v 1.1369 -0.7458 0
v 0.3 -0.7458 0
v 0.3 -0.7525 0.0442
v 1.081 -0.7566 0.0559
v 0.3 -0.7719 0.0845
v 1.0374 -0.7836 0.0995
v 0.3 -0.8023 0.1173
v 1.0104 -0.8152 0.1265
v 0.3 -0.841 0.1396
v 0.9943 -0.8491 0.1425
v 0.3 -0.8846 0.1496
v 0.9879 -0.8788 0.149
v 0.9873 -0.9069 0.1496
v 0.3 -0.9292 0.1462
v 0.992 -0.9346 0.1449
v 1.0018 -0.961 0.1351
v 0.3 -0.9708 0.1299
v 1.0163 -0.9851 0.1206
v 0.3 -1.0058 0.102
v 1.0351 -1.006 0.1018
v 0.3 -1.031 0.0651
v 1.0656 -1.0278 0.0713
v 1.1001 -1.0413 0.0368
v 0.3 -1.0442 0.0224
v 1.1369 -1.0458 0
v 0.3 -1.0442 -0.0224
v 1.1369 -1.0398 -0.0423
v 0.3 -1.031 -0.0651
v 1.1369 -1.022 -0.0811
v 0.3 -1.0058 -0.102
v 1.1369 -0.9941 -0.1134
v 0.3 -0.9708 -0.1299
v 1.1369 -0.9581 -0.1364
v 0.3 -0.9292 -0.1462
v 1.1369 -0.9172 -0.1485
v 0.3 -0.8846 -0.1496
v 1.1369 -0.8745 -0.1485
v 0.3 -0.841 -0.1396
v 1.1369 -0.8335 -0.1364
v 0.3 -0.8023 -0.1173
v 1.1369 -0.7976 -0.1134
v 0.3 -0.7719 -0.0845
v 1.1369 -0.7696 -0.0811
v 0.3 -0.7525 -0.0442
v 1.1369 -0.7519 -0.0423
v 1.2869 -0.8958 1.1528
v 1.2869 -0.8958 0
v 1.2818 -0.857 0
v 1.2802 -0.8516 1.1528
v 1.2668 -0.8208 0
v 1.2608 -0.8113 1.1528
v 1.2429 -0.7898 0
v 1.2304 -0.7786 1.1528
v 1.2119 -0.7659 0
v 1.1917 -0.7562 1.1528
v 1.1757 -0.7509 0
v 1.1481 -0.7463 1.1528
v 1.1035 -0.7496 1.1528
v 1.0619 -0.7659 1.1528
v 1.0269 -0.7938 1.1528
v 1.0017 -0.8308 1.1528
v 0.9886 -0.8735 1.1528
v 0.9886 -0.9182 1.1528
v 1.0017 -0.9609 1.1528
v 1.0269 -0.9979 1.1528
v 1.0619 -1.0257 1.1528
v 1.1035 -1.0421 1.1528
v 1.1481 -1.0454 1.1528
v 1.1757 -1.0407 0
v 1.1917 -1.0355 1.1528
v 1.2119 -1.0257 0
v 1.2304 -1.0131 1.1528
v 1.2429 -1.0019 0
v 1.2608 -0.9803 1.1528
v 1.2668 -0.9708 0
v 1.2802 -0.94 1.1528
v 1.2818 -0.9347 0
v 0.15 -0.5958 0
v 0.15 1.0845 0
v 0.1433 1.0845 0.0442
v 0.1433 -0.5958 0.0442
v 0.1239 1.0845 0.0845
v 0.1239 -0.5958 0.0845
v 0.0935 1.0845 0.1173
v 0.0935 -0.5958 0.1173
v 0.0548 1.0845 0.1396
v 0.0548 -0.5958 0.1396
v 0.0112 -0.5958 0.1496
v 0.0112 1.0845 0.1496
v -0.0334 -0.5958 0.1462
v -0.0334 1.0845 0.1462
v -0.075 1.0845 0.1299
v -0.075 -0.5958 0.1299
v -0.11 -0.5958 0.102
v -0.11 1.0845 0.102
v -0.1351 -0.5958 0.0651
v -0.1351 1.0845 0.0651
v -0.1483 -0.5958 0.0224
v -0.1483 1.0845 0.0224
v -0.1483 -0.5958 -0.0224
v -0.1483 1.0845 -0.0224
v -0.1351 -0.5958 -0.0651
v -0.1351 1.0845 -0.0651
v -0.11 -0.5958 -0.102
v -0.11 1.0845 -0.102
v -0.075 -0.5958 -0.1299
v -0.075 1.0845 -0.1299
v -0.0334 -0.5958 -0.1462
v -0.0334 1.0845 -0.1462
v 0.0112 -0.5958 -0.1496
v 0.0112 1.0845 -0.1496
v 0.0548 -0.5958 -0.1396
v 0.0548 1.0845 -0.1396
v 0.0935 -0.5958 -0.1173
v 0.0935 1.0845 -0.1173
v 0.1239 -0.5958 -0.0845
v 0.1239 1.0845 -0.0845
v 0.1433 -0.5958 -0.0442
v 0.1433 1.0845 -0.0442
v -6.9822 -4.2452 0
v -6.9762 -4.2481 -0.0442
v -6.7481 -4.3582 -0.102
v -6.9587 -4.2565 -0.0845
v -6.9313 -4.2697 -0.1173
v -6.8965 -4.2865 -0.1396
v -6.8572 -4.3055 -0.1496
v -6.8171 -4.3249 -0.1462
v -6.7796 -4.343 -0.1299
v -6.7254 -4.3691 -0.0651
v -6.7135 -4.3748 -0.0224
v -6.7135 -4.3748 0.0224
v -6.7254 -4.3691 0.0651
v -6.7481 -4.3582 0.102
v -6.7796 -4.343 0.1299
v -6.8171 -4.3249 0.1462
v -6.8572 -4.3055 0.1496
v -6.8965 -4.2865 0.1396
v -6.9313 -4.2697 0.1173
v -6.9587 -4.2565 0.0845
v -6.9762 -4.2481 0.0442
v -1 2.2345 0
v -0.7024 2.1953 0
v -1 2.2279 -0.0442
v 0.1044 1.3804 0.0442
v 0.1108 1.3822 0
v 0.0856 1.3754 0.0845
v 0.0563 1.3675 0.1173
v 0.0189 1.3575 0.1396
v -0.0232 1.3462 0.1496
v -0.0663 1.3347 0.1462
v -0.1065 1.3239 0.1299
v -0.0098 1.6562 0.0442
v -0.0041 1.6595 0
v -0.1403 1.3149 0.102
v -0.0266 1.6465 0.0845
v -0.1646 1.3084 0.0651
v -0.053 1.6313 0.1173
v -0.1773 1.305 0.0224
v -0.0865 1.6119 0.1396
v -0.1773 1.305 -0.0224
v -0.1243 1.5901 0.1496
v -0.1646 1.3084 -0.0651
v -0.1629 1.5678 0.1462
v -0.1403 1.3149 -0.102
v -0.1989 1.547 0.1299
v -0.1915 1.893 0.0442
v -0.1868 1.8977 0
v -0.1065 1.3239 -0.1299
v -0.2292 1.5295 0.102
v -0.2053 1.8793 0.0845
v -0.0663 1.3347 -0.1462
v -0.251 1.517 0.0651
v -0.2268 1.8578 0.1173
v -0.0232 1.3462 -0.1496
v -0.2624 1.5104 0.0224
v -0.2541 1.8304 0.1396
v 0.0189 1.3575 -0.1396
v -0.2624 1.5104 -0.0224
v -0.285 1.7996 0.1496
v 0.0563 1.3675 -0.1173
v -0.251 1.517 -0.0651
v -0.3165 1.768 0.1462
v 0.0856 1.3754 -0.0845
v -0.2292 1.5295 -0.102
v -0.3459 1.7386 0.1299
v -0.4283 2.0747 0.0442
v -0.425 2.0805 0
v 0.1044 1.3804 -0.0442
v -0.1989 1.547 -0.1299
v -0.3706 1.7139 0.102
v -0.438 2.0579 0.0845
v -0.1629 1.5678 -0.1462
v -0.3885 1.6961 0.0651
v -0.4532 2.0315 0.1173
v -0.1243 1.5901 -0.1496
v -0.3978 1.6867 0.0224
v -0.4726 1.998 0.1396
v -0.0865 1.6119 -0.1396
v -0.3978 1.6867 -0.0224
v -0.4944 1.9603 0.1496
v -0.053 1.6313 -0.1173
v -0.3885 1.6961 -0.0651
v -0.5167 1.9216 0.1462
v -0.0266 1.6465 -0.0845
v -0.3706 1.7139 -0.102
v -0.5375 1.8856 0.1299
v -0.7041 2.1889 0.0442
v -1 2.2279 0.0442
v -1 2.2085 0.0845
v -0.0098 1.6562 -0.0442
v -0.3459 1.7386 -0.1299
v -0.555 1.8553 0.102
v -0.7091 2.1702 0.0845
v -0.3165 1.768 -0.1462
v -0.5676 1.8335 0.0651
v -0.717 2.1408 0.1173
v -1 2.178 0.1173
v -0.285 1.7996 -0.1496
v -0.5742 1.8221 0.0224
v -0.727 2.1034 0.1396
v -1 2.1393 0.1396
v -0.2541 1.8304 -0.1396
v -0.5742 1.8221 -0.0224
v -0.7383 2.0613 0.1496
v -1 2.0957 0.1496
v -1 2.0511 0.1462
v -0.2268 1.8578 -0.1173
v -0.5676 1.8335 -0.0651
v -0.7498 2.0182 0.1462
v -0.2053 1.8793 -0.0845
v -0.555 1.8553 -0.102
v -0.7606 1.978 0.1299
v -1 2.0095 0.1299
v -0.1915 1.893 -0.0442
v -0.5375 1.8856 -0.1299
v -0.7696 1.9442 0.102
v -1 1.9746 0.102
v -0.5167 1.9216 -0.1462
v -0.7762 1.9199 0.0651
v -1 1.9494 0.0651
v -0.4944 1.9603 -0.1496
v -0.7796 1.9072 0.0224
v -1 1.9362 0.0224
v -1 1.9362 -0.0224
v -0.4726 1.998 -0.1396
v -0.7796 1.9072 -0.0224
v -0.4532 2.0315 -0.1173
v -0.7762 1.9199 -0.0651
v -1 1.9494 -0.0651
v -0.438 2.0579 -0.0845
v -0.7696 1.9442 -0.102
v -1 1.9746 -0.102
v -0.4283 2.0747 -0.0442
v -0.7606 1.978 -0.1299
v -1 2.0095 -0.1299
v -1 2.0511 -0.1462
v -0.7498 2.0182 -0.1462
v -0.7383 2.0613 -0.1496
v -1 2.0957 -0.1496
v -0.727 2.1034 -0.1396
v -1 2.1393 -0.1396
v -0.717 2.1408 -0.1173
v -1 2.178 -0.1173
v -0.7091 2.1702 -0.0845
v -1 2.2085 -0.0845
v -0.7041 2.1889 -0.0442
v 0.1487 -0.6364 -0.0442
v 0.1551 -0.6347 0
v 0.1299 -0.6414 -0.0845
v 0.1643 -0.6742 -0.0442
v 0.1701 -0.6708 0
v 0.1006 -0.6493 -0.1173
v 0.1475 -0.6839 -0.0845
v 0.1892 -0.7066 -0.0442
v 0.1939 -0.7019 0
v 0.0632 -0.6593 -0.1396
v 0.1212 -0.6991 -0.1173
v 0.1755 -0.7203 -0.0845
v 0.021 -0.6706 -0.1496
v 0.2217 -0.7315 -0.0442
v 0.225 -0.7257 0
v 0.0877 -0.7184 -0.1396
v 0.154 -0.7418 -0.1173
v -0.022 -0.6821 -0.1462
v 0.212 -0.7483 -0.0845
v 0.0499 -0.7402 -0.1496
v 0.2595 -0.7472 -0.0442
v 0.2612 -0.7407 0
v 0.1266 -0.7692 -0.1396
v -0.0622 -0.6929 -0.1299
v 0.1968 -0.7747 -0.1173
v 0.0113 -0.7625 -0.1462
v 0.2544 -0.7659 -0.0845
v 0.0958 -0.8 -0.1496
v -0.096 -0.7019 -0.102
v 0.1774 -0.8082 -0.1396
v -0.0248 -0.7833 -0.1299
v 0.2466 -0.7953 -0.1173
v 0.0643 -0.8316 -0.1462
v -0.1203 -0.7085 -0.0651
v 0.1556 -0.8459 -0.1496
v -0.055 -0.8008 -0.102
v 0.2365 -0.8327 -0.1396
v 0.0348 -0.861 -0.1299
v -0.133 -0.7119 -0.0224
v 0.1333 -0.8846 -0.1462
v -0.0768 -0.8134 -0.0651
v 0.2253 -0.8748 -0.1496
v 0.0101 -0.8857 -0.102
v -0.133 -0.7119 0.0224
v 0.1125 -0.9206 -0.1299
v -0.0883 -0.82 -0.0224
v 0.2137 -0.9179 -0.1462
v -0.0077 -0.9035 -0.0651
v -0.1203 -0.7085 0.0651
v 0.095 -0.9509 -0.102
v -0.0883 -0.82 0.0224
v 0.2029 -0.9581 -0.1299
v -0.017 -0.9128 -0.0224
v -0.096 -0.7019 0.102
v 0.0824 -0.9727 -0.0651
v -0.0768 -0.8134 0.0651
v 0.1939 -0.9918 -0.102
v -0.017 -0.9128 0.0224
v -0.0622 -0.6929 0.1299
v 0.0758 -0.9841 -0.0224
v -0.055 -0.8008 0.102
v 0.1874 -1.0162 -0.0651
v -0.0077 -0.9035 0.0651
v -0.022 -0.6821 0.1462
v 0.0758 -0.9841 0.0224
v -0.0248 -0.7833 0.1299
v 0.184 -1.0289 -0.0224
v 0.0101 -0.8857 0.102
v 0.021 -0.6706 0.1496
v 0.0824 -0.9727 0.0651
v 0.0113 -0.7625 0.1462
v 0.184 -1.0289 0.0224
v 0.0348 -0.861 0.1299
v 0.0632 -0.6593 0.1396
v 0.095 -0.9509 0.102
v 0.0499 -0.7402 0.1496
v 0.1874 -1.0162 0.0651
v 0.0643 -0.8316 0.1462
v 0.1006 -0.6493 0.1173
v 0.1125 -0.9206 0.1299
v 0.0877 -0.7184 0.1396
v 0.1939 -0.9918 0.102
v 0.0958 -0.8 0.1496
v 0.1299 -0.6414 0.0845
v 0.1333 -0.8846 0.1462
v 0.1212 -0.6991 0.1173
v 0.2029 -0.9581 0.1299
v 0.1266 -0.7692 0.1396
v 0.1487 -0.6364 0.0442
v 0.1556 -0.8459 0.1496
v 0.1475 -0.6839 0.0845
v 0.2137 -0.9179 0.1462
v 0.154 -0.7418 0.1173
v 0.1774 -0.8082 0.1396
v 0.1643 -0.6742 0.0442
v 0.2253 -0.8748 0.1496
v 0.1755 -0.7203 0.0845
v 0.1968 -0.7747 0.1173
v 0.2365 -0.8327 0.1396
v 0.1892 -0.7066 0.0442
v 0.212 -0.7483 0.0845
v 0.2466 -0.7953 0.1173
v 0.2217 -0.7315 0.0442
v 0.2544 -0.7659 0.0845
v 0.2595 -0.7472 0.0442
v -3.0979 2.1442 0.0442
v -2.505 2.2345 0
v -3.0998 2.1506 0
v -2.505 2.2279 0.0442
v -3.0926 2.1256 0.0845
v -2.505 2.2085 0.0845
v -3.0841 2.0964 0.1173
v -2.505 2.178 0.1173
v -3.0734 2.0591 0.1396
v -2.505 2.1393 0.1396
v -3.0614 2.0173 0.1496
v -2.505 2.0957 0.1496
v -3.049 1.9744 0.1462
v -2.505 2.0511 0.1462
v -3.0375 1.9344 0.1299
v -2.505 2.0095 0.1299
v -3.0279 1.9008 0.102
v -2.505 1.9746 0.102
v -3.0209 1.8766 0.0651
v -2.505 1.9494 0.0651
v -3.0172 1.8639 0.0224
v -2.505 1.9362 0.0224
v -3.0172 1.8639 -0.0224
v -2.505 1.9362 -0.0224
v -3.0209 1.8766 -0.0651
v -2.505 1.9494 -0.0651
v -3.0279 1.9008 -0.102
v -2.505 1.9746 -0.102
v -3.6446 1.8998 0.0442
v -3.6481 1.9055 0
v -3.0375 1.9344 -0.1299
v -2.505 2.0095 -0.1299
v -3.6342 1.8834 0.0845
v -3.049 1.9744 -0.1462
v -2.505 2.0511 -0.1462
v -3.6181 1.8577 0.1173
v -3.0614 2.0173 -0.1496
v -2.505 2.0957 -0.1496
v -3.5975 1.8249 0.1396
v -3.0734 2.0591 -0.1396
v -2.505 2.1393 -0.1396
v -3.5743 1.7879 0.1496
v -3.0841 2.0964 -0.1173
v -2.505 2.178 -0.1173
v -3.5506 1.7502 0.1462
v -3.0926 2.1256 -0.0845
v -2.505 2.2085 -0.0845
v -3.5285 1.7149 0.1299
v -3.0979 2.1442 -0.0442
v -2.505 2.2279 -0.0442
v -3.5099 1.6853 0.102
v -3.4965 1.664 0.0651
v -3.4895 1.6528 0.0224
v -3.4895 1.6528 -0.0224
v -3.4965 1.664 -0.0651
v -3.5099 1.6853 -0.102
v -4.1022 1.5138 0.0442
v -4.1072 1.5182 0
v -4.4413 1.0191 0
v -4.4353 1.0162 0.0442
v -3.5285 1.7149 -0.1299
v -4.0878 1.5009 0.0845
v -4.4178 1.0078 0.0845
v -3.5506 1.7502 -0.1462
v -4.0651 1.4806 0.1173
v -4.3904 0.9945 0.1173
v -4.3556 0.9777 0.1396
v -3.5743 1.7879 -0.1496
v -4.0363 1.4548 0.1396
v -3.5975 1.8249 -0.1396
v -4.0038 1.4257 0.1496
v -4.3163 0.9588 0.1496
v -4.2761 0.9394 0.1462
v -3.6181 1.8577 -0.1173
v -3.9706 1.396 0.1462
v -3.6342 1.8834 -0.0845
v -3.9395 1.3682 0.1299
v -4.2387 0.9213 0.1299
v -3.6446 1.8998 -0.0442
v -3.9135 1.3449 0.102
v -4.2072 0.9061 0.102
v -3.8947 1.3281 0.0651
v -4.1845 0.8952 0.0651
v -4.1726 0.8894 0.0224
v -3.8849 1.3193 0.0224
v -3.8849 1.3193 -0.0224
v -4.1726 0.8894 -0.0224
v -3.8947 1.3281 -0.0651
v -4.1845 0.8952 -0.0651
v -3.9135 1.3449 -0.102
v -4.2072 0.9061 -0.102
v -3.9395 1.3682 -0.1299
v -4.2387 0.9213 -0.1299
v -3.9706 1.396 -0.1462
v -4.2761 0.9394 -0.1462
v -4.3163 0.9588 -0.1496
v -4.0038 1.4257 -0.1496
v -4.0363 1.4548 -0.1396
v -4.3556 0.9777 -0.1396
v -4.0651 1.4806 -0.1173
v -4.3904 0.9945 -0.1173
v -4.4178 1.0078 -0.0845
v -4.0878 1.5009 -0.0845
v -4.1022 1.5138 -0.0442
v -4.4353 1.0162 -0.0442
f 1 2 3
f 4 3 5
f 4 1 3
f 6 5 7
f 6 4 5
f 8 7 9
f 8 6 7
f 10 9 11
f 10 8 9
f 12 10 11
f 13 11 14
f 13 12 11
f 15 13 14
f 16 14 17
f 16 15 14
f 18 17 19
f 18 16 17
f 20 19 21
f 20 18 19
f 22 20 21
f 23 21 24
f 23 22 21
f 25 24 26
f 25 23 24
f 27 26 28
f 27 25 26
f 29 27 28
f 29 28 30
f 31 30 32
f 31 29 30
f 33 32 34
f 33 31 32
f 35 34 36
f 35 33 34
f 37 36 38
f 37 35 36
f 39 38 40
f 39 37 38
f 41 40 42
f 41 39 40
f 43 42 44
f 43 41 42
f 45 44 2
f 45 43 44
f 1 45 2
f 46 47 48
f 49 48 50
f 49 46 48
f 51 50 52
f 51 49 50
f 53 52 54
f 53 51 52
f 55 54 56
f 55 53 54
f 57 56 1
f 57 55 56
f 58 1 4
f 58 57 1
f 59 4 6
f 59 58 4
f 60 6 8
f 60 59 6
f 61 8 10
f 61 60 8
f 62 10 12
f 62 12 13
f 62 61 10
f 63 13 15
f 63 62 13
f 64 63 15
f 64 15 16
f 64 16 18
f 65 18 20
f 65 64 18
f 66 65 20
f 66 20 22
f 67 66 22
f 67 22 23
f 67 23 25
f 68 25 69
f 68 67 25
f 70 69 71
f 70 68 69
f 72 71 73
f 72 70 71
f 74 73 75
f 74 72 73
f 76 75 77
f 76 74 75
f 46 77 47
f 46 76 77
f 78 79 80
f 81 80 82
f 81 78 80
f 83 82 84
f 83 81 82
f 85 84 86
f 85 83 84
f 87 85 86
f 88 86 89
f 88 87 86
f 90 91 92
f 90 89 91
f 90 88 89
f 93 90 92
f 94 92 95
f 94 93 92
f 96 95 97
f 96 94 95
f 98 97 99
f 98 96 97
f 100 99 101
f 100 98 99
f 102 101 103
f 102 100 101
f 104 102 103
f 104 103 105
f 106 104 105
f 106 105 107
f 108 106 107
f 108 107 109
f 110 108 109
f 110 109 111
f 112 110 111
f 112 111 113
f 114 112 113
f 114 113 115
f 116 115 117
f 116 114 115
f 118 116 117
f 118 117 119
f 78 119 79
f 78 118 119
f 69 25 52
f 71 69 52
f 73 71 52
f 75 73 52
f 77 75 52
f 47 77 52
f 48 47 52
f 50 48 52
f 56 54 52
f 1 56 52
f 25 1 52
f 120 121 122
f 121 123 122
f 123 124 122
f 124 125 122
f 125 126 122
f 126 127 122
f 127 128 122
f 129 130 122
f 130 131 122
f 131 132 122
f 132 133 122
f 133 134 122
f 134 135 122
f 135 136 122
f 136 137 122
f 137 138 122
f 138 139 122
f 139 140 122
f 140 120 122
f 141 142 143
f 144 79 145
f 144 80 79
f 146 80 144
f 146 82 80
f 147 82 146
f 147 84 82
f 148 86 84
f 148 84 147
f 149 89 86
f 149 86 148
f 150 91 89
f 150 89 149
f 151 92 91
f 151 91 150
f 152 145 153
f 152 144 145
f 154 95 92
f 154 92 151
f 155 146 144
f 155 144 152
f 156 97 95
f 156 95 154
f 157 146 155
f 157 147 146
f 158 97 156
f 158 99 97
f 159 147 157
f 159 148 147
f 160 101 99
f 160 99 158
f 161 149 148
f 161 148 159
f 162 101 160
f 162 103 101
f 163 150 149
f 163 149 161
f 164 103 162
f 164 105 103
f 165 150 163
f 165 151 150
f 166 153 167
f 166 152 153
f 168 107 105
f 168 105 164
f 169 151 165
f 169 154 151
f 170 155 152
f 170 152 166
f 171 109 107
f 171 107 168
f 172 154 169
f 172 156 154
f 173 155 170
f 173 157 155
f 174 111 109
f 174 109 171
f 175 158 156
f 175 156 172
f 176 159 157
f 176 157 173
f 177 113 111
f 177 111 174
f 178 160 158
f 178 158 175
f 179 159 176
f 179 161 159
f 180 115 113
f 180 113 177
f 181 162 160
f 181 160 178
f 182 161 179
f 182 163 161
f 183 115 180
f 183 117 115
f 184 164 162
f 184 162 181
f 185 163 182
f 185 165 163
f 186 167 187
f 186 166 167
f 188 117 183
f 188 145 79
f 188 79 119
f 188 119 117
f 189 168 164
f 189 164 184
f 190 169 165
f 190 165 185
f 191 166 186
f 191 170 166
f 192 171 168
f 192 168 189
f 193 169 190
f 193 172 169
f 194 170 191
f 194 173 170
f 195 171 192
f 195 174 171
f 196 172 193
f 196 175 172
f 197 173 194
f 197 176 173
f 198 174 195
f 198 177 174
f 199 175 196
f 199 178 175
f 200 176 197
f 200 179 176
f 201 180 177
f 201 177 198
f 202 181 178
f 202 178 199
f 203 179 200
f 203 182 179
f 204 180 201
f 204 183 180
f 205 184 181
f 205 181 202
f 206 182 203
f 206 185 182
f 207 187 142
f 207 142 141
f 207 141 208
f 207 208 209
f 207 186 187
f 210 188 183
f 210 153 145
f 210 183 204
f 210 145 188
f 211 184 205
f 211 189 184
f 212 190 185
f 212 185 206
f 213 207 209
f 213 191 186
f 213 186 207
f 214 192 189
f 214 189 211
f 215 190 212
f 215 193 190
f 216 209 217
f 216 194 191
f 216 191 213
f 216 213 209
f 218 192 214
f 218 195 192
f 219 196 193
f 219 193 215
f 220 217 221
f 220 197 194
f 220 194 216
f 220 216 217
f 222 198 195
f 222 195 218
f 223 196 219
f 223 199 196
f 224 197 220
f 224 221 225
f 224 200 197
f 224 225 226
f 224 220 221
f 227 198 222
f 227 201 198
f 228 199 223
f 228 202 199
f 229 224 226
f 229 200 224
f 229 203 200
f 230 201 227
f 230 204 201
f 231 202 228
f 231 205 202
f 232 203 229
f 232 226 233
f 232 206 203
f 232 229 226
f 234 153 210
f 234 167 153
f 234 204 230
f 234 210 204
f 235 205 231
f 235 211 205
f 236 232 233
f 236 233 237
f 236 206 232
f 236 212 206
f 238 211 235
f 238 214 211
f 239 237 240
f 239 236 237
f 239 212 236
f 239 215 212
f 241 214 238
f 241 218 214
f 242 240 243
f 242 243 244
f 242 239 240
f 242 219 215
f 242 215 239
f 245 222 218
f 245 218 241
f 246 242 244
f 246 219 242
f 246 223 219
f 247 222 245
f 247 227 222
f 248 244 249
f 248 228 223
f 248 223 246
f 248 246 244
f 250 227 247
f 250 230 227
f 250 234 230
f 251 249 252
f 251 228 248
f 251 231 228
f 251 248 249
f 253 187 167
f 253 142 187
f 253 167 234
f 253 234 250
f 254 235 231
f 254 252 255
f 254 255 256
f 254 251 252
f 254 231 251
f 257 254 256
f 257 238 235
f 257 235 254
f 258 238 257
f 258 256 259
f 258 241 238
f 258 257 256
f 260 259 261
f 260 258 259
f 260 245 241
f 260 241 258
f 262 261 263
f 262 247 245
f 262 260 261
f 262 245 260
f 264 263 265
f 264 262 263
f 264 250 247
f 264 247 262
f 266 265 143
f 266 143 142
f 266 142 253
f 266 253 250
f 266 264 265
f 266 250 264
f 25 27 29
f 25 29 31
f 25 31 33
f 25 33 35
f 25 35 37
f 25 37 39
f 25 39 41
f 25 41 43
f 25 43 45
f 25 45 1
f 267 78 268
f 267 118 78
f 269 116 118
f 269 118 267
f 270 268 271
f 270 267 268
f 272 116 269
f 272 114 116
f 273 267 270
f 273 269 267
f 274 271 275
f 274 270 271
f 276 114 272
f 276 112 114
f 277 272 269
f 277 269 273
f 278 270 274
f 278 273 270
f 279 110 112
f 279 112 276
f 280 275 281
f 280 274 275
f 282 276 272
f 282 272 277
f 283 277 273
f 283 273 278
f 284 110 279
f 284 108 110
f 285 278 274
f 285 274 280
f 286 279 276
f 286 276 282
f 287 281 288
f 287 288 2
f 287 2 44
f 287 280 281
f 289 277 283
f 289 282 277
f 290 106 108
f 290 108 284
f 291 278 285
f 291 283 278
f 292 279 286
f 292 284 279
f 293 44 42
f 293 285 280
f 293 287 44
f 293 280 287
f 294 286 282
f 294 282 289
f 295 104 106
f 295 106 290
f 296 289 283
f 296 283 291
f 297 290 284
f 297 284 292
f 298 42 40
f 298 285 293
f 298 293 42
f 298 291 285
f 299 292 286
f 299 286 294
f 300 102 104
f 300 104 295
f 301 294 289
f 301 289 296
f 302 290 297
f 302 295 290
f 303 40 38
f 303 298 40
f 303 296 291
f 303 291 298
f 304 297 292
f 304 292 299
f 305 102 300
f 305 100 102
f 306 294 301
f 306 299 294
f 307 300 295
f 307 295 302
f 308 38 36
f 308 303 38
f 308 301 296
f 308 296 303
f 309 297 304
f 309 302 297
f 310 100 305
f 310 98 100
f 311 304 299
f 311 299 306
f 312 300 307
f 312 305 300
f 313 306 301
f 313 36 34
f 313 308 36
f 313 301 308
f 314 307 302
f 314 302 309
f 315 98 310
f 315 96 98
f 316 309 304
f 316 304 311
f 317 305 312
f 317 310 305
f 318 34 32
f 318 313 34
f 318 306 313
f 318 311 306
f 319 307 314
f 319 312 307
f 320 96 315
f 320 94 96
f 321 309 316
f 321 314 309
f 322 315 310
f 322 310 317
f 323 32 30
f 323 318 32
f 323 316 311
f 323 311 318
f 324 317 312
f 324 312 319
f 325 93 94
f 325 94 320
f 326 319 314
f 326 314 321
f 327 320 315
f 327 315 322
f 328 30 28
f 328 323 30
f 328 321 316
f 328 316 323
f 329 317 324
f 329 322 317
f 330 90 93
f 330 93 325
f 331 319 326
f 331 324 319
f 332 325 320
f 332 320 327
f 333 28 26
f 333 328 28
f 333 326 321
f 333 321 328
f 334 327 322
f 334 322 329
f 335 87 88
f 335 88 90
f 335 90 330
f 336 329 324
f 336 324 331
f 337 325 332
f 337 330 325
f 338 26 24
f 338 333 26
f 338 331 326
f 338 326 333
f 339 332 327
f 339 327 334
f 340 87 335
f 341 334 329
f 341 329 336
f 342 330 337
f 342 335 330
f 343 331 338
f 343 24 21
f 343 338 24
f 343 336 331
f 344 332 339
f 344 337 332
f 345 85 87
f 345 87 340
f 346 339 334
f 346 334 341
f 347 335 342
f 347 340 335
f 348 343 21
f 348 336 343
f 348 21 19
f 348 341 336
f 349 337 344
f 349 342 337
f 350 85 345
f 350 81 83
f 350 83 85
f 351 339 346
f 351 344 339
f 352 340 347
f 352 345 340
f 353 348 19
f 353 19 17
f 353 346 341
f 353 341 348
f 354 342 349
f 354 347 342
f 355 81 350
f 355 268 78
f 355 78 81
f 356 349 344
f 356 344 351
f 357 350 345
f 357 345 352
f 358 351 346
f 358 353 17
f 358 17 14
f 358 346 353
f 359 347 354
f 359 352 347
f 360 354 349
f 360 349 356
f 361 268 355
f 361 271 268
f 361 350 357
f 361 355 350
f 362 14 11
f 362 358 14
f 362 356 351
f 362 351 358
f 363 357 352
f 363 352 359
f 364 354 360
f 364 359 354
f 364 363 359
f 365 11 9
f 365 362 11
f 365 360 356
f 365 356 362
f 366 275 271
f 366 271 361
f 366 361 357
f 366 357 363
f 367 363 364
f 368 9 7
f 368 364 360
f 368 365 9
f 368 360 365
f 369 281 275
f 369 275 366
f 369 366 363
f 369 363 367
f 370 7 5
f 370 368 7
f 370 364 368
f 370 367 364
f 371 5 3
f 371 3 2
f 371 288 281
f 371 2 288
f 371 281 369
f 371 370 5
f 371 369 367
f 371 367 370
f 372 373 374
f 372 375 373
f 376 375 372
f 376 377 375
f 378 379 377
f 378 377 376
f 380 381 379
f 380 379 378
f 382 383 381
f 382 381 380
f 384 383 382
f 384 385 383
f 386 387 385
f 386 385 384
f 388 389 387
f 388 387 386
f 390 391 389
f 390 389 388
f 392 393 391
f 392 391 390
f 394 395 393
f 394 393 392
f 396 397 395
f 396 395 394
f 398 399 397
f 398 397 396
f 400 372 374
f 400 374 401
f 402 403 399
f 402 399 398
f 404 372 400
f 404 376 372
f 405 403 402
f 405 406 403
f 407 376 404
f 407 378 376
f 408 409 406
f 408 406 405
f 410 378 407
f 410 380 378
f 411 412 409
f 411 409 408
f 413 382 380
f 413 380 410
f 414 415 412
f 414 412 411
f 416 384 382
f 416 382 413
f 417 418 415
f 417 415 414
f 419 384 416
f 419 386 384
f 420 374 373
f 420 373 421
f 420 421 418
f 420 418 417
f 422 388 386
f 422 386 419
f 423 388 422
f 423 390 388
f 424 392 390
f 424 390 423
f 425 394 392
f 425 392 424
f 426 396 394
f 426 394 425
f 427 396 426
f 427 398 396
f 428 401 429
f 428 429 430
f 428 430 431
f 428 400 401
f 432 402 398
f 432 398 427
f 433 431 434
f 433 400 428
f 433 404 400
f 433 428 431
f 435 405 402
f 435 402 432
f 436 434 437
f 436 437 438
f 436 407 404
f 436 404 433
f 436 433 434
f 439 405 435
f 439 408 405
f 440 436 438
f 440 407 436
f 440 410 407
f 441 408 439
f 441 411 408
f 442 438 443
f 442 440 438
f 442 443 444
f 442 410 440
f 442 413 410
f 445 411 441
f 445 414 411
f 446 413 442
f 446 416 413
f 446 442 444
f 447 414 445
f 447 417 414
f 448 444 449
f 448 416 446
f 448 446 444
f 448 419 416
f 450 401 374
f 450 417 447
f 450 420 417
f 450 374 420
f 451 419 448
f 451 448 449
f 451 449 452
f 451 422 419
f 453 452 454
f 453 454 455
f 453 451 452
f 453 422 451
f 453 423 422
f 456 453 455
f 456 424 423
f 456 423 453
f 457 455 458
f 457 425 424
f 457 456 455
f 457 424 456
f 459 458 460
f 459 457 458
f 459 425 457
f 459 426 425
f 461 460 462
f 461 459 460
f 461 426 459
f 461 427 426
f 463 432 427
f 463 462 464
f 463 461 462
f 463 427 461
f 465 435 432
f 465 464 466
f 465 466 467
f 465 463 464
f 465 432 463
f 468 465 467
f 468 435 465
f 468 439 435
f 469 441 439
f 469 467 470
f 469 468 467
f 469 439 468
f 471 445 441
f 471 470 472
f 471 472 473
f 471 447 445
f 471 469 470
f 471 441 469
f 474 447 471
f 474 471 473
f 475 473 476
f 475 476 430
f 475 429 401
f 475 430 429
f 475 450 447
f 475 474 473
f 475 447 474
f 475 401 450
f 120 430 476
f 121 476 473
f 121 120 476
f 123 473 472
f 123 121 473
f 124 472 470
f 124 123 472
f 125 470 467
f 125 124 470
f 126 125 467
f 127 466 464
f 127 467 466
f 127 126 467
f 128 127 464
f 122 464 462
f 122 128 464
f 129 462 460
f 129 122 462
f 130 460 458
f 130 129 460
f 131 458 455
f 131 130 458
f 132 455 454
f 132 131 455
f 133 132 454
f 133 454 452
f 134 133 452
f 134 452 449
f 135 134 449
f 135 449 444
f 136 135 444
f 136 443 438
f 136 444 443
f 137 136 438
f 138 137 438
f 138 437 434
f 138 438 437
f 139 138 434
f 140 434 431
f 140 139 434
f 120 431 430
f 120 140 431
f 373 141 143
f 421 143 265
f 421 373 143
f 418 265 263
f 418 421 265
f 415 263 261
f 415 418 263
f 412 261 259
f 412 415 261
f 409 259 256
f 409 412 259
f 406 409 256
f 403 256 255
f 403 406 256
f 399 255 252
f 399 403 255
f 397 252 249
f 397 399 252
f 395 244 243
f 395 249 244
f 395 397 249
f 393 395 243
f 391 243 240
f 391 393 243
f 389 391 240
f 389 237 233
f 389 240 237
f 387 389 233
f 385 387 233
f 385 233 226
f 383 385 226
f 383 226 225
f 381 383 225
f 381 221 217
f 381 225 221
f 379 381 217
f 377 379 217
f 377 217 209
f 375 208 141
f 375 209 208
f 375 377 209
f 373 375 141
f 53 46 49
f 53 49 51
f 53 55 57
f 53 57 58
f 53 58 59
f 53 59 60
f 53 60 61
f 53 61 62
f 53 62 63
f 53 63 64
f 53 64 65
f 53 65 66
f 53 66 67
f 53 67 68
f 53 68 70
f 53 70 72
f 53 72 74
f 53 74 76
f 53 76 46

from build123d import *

# Parameters (mm, degrees)
F0_R = 0.15
F6_R = 0.15


with BuildPart() as f2:
    # F2: sweep along a path in F1
    with BuildLine(Plane.XY) as f2_path:
        Line((0, 0), (0, 1.0845226934))
        ThreePointArc((0, 1.0845226934), (-0.2928932188, 1.7916294746), (-1, 2.0845226934))
        Line((-1, 2.0845226934), (-2.505036419, 2.0845226934))
        ThreePointArc((-2.505036419, 2.0845226934), (-3.5683457273, 1.7784451577), (-4.3061999428, 0.9538960083))
        Line((-4.3061999428, 0.9538960083), (-6.8471138366, -4.3103573844))
    # F0 (on Front) → F2 (sweep)
    with BuildSketch(Plane.XZ):
        Circle(F0_R)
    sweep(path=f2_path.line)

    # F4: sweep along a path in F3
    with BuildLine(Plane.XY) as f4_path:
        Line((0, 0), (0, -0.5958363181))
        ThreePointArc((0, -0.5958363181), (0.0878679656, -0.8079683525), (0.3, -0.8958363181))
        Line((0.3, -0.8958363181), (1.136880412, -0.8958363181))
    # F0 (on Front) → F4 (sweep)
    with BuildSketch(Plane.XZ):
        Circle(F0_R)
    sweep(path=f4_path.line)

    # F7: sweep along a path in F5
    with BuildLine(Plane.YZ.offset(1.136880412)) as f7_path:
        Line((-0.8958363181, 0), (-0.8958363181, 1.1528083123))
    # F6 (on Top) → F7 (sweep)
    with BuildSketch(Plane.XY):
        with Locations((1.136880412, -0.8958363181)):
            Circle(F6_R)
    sweep(path=f7_path.line)


solid = f2.part
